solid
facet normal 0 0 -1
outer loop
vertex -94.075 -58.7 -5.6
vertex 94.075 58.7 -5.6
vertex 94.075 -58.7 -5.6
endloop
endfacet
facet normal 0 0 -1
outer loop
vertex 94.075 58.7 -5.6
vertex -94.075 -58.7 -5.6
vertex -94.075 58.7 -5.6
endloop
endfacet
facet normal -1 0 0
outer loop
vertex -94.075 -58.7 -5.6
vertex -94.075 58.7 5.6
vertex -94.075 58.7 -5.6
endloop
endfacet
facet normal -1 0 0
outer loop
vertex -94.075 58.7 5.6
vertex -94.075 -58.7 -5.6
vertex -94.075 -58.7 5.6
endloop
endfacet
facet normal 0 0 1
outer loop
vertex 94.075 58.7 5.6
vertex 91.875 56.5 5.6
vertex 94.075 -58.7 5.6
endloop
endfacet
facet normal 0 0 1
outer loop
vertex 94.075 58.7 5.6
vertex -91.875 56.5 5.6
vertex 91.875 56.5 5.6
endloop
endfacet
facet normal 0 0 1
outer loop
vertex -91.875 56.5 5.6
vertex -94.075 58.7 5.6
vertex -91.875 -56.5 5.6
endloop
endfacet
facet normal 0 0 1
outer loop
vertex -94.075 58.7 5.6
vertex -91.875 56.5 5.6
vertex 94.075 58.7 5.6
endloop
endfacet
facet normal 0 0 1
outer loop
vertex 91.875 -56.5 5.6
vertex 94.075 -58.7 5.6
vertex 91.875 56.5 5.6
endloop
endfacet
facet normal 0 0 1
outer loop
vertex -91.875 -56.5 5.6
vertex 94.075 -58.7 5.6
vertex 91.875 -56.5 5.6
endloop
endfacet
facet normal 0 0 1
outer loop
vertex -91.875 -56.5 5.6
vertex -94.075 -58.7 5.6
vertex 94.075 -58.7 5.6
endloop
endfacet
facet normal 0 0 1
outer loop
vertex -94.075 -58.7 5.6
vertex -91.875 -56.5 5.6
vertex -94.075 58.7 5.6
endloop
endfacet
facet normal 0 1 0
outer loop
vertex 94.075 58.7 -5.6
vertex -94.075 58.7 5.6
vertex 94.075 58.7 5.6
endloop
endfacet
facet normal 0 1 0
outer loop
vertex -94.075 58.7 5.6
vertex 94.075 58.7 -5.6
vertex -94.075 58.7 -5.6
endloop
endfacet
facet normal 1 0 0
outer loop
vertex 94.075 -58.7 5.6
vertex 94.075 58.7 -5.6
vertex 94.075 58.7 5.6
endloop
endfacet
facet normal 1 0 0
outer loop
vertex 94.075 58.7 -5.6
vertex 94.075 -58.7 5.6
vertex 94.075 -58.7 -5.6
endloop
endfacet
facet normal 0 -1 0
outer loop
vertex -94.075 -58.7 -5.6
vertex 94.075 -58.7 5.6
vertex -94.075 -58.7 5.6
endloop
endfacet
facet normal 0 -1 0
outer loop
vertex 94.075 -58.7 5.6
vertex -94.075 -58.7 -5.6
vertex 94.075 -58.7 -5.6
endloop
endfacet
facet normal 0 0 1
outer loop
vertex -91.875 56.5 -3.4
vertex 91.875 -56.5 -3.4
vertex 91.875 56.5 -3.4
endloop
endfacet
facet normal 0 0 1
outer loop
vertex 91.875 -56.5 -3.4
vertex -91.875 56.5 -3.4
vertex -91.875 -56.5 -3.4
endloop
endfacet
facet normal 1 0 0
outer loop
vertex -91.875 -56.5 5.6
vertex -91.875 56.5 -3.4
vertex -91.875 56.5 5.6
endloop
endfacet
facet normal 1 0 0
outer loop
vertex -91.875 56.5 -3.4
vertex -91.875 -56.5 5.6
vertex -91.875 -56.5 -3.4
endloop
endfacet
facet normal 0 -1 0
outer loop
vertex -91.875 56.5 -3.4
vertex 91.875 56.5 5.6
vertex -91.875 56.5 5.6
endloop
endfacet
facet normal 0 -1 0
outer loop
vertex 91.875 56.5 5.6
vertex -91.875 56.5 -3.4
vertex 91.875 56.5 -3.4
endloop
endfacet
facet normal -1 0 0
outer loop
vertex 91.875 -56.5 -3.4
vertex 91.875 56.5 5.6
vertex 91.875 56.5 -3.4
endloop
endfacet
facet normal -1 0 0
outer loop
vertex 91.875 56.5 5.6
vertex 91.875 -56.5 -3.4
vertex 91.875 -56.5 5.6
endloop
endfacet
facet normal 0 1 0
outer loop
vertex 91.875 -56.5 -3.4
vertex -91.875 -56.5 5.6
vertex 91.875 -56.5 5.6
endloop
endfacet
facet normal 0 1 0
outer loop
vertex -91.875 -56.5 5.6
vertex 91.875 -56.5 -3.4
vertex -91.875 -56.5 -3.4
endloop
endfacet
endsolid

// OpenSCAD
// file: myTools.scad
module tube (r = 0, d = 0, l = 0, 
            thick = 0, 
            bCentered = true, 
            taper_pct = 0, 
            circlip = false) // r=radius d=dia l=length 
{
    assert( r != 0 || d != 0, "specify one of radius or diameter");
    assert( l != 0 , "tube: need length 'l' to be non zero");
    assert( thick != 0, "wall thickness cannot be zero");

    punch = $preview ? .2 : 0; // stop funny view artifact

    dia = r ? r * 2 : d;

    od = ((thick > 0) ? dia + thick * 2 : dia);
    id = (thick > 0) ? dia             : dia  + thick *2; 

    
    
    if (thick > 0)
        echo ("tube\tMIN id = ", id, "od = ", od, "wall = ", thick, "center= ", bCentered);
    else
        echo ("tube\tMAX od = ", od, "id = ", id, "wall = ", thick, "center= ", bCentered);

    echo ("tube\tHeigth = ", l);
        
    if (taper_pct != 0)
    {
        echo ("tube\t*** OD expanded by ", taper_pct, "%, : bottom od = ", od * (1. +taper_pct/100), "top od = ", od);
    }
    
    assert(dia || dia < 0, "tube : missing r or d ");
    
    // if taper_pct specified, the base will always be closest to 0,0,0
    translate([ 0, 0, taper_pct == 0 ? 0: bCentered ? l/2:l  ])
    rotate([0, taper_pct == 0 ? 0 : 180, 0 ])

    difference()
    {
        // make a reese's cup
        {
            color("YELLOW", .3)
            linear_extrude(height= l, scale = 1 + taper_pct/100)
                difference()
                {
                    circle(d = od);
                    circle(d = .5);
                }
        }
    
     // hollow out reessed cup
     color("GREEN")
     translate([0, 0, -punch/2])
     linear_extrude(height= l+ punch*2, $fn=100)
     {
        circle(d = id);
        if (circlip) #square([1 + punch, od ]);
     }
    
    }
}
//==============================================================================
        
module abox (dims, 
            thick = 0, 
            bCentered = true, 
            round_out = 0, 
            round_in = 0, 
            bSolid = false,
            bHollow = false,
            elevator = 0)   // move bottom up by X
{
    punch = $preview ? .1 : 0; // stop funny view artifact
    
    assert(thick != 0, "Thick must be specified. +=outside dim, -= inside dims");
    assert(dims.z > thick, "wall thickness too large for depth of box");

    wall2 = abs(thick) * 2; // 2 walls in each direction
    wall = wall2 / 2;
    
    // box either grows inward (thick < 0) or outward (thick > 0)  from dims
    fat = dims + [ wall2, wall2, wall];
    thin = dims - [ wall2, wall2, wall];
    
    offset = (thick > 0 && bCentered == false) ? wall : 0;
    
    //echo ("abox : adjusting x,y,z by ", offset, " to move origin from  center to 0,0,0");
    translate( [ bCentered ? 0 : dims.x /2 + offset, bCentered ? 0 : dims.y /2 + offset, bCentered ? 0 : dims.z /2 + offset/2]) 
    {
        if (thick > 0)
        {   
            // wall grows outwards from users dim
            echo ("making a box, MAX INSIDE dim = ", dims, "a wall=", thick, "mm ... max outside = ", fat, " mm");
        }
        else
        {
            // wall grows inward from users dime
            echo ("making a box, MAX OUTSIDE dim = ", dims, "a wall=", thick, "mm ... min inside = ", thin, " mm");
        }
        
        // linear extrude alway works in the positive x/y plane an goes upward.
        // after calc, re-center about 0,0,0 where a bCentered cube would be
        
        translate([ 0, 0, thick > 0  ? -fat.z/2 : -dims.z/2 ])
        difference()
        {
            echo ("round_out = ", round_out);

            // MAKE SOLID BOX --------------------------------------
            router_outside = round_out ? round_out : 0;
            x = thick > 0  ? fat.x - router_outside : dims.x - router_outside;
            y = thick > 0  ? fat.y - router_outside : dims.y - router_outside;


            // MAKE PUCHNED INSIDE
            // using 'offset' it will add r on all dimensions, then round., 
            // so now you have fatter perimeter than you started with :(
            //  but at least the corners are round.
            
            // Compensate by shrinking dimension by r, 
            // and then by calling offset, offset will then add it back

            color("YELLOW", .2)

            linear_extrude(thick > 0  ? fat.z : dims.z)
            if (round_out)
            {
                offset( r= round_out, $fn=30)
                square( [x - router_outside, y - router_outside], true);
            }
            else square( [x - router_outside, y - router_outside], true);
           
            // time to punch out the inside if requested.
            if (bSolid == false)
            {
                hollow_offset = bHollow ? fat.z/2 + .2  : dims.z/2 +.2;
                // punching out inside. its either dims or thin.
                router_inside = round_in;
                echo ("round_in = ", router_inside);
                xi = thick > 0  ? dims.x  : thin.x;
                yi = thick > 0  ? dims.y : thin.y ;

                color("GREEN")

                // move 'punch' up if you need a bottom else zero (hollowed out)

                translate([ 0,0, bHollow ? -.1 : wall + elevator]) 
                linear_extrude(thick > 0  ? fat.z - wall  + hollow_offset : dims.z - wall + hollow_offset)
                //#linear_extrude(fat.z - wall  + hollow_offset)
                
                if (round_in) 
                {
                    offset( r= round_in, $fn=30)
                    square( [ xi - router_inside, yi - router_inside], true);
                }
                else
                    square( [ xi, yi], true);
            }
        }
    }
 }


// 50x25x10 box walls grow inward (-2). on center origin midpoint
// rounded outside (default), sharp corner inside(default), bCentered about 0,0,0
//color("GREEN", .9)
//abox([50,25, 10], -2, true); 


// 50x25x10 box walls grow inward (-2). on center origin midpoint
// sharp outside corners, rounded inside corners. Sit on x,y plane
color("BLUE", .9)
abox([50,20, 10], +2, round_in=2, bCentered = false);  // 50x25x10 box inside dim origin has 0,0


// 50x25x10 box walls grow inward (-2). on center origin midpoint
// sharp corners inside and out. sits on x,y plane
color("GREY", .9)//
translate([ 55, 0, 0])      
abox([50,20, 10], +2, round_out=3, false);

color("PINK", .9)//
translate([ 115, 10, 10])      
abox([86.66, 56.865, 5], -5, bHollow = true, bCentered = false); 

color("GREEN", .9)//
translate([ 140, 10, -10])      
abox([86.66, 56.865, 5], 3, bHollow = true, bCentered = false); 

/*
// 50x25x10 box walls grow inward (-2). on center origin midpoint
// round corners outside and SOLID
color("BLUE", .9)//
translate([ 55, 0, 0])      
abox([50,25, 10], +2, round_out=2, round_in=0, false, bSolid = true); // 50x25x10 box outside dim origin is 0,0
*/

//translate ([-30,-30, 0])
{
/*
    // tube outer dia  20, inner dia = (20 - 8)
    color("PINK")
    tube (d = 20, l = 20, thick = -8, bCentered = false);

    // tube, inner dia = (2* 10), outer dia = ((2*10) + 2) 
    color("PURPLE", .3)
    tube (r = 10, l = 20, thick = +2, bCentered= true);
*/
/*
    tube (d = 60, l = 20, thick = -6, bCentered = false);

    translate([0, 0, 50])
    tube (d = 60, l = 20, thick = -6, bCentered = false, taper_pct = 20, circlip = true);
    //color("GREEN")
    //tube (d = 20, l = 20, thick = -2, bCentered = false, taper = 10, circlip = true);
*/

}
// main file
//use <otherPeoplesWork/threads-scad/threads.scad>
use <myTools.scad>

/* [Hidden] */

x = 150 + 33.75; // BEAGLE 
y = 113; // BEAGLE
z = 9; 

$fn=60;   //circle quantize 360/10=36 degrees per side

// container for the BEAGLE
BEAGLE_outside = [ x, y, z];

module build_BEAGLE()
{
        // container for the BEAGLE
        abox( BEAGLE_outside, thick = +2.2, bRoundOut=2, bSolid = false, centered = false);
 }

build_BEAGLE();
